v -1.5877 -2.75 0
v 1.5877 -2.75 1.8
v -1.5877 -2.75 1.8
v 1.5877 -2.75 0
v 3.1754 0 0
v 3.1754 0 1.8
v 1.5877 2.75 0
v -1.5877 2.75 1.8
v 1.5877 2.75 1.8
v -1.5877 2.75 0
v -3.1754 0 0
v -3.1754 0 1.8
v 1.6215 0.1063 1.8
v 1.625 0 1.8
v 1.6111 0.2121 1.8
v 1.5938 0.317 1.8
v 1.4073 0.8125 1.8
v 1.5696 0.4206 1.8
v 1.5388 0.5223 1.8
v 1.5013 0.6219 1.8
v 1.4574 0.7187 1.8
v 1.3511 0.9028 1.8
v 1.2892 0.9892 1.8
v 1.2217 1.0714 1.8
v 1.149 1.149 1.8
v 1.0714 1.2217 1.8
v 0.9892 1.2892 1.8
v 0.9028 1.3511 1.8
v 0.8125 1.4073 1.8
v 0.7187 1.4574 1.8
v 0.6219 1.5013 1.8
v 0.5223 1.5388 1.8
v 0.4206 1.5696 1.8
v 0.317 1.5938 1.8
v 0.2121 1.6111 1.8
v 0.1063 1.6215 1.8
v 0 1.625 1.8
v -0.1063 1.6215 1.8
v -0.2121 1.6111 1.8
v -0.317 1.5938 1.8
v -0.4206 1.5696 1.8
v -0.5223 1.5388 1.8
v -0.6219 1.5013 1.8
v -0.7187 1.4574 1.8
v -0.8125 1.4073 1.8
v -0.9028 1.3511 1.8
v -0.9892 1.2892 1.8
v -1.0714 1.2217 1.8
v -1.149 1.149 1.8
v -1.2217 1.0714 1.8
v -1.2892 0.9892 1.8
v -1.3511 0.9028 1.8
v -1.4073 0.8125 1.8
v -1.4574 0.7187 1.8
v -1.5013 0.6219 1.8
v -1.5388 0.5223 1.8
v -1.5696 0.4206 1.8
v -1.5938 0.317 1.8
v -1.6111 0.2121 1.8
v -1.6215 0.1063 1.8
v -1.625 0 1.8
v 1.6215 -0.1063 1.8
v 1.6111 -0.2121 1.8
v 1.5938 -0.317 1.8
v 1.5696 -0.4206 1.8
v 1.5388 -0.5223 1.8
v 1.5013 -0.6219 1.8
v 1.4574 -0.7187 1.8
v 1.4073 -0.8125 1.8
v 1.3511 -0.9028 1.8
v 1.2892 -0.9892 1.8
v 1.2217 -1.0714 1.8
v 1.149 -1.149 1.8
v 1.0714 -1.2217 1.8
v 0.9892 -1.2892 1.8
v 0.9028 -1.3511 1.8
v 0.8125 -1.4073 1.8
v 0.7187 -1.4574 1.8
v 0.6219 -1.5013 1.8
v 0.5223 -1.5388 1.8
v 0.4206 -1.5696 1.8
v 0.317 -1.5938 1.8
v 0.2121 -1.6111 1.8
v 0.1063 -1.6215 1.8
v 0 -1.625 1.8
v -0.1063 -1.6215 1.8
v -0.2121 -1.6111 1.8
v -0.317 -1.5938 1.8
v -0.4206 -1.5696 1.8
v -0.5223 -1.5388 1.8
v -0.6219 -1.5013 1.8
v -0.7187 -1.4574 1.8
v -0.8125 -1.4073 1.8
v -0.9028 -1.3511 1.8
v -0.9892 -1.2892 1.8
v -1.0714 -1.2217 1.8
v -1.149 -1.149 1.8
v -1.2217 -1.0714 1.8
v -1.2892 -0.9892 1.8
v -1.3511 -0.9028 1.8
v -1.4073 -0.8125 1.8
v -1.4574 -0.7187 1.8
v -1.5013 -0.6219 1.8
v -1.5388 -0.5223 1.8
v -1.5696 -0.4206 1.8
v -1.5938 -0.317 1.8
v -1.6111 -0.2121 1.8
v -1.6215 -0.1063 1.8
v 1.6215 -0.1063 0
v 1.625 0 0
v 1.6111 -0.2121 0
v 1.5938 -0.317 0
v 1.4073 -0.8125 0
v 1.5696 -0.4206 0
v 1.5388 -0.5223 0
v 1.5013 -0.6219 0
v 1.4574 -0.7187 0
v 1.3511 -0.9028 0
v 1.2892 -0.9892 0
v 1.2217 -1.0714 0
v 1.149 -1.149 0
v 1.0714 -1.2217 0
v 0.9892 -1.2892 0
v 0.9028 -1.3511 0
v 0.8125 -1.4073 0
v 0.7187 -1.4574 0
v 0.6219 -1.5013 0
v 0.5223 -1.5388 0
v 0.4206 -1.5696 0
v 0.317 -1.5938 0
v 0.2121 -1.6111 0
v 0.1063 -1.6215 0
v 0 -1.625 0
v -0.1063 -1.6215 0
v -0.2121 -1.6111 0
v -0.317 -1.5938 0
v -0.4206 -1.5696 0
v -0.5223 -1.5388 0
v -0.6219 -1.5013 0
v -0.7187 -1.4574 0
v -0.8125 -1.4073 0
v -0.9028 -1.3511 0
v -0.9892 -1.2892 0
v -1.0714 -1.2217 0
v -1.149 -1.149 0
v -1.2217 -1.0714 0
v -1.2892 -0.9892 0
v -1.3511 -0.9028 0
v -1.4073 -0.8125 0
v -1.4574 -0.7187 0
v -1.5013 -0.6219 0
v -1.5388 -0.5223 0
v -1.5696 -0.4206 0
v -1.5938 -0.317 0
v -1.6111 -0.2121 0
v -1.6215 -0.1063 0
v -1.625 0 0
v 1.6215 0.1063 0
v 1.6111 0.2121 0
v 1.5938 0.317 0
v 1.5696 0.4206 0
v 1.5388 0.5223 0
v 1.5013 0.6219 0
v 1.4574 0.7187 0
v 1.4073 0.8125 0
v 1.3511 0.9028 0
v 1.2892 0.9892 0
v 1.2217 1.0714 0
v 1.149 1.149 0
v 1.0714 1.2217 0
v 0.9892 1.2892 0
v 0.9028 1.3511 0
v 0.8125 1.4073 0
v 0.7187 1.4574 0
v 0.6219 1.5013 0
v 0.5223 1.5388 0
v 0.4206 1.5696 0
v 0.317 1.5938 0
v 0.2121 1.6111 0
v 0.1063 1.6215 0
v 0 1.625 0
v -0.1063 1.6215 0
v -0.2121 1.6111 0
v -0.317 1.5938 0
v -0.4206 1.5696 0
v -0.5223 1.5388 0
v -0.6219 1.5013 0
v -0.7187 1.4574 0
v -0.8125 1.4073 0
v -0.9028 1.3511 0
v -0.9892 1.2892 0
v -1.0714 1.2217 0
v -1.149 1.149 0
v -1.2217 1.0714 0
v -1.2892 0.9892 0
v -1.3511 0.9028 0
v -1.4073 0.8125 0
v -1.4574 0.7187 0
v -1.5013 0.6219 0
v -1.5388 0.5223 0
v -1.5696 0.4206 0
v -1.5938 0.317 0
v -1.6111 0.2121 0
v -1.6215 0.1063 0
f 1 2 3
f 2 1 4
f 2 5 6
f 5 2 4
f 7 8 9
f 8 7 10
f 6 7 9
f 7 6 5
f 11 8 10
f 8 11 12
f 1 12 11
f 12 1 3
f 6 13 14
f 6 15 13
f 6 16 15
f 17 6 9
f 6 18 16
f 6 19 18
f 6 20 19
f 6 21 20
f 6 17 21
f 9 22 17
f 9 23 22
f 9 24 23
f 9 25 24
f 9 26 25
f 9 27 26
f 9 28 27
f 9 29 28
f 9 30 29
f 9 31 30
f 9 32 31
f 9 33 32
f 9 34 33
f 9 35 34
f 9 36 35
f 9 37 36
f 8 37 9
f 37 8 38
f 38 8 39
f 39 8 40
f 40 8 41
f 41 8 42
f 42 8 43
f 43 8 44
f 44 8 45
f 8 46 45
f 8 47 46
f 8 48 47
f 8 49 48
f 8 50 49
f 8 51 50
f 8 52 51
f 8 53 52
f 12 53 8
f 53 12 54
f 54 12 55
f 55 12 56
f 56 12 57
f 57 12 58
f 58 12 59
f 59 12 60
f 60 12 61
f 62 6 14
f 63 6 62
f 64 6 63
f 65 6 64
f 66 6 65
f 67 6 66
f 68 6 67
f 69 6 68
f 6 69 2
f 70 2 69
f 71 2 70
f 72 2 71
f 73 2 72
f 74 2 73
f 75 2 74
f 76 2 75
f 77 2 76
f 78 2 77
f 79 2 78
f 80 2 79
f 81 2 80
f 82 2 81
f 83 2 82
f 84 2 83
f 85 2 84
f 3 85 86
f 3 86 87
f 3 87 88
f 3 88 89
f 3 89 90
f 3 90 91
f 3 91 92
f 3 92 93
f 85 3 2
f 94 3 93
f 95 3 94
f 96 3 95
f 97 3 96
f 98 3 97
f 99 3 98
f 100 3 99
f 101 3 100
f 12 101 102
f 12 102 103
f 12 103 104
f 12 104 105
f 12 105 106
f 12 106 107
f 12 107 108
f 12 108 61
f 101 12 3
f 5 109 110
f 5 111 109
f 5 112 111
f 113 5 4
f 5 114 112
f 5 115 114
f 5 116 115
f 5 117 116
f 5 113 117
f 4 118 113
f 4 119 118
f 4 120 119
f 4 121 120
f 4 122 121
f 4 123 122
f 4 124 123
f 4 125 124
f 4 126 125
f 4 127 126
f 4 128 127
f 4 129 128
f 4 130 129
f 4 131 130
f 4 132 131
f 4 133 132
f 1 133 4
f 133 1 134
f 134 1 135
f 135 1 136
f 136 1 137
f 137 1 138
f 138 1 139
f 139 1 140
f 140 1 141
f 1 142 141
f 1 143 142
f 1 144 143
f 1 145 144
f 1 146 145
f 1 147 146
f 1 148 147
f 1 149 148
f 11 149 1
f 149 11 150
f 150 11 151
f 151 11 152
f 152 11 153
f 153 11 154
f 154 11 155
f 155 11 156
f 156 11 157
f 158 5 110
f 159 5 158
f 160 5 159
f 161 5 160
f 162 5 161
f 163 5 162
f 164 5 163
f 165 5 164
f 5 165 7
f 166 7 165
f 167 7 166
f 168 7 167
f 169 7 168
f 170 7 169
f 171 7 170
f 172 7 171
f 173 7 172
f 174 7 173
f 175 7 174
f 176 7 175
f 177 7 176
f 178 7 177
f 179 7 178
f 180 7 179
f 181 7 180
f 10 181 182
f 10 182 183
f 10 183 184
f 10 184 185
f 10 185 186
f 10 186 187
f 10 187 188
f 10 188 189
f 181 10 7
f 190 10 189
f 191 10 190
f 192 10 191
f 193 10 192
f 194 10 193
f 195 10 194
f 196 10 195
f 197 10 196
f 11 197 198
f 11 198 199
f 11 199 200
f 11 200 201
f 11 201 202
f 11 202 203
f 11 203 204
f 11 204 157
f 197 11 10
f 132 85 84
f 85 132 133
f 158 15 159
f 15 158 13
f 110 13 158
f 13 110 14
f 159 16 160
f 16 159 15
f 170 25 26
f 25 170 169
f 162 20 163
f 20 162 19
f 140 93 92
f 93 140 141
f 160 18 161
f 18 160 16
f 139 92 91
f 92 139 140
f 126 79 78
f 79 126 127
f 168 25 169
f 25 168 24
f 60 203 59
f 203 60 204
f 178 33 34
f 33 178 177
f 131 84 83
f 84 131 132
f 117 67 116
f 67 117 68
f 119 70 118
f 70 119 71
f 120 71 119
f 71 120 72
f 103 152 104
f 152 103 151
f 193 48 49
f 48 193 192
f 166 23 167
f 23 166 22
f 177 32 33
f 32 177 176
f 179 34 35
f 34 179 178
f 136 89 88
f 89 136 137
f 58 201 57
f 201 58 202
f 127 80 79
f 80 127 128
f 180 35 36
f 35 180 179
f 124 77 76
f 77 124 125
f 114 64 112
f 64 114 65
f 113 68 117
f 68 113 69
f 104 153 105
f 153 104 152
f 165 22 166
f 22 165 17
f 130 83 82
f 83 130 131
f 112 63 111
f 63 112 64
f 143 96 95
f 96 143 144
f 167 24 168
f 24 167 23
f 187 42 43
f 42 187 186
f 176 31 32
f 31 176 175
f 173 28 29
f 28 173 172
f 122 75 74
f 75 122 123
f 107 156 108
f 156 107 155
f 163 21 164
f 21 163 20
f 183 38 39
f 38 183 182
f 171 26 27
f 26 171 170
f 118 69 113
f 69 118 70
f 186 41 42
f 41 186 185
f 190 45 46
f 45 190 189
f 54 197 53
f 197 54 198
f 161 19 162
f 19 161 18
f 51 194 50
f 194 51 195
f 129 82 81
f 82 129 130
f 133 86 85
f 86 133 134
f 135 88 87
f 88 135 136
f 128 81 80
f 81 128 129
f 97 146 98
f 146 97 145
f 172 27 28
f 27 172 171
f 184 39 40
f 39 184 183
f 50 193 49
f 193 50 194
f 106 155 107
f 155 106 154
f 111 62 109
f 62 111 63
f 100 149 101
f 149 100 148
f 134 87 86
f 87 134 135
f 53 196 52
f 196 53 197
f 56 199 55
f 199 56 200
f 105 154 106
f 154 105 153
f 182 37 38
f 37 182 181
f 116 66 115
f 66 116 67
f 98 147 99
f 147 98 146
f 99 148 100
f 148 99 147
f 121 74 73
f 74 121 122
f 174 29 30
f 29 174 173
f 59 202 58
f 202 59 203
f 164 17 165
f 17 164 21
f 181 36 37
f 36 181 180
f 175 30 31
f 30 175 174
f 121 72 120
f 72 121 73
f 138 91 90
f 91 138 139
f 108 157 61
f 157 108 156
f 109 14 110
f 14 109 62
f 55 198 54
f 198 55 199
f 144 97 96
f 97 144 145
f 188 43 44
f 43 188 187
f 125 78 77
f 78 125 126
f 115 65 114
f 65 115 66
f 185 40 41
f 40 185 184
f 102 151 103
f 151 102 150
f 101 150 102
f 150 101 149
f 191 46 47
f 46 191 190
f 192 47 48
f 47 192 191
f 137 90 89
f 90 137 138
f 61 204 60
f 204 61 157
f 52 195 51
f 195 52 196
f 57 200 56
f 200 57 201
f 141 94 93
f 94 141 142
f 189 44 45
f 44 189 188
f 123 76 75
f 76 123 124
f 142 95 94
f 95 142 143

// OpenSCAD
$fn = 96;

across_flats = 5.5;   // mm
thickness    = 1.8;   // mm
screw_d      = 3.0;   // mm (clearance hole)

clearance = 0.25;     // mm added to screw diameter for clearance
hole_d = screw_d + clearance;

module hex_prism_af(af, h) {
    // For a regular hexagon, circumradius R = af / sqrt(3)
    R = af / sqrt(3);
    cylinder(h = h, r = R, $fn = 6);
}

difference() {
    hex_prism_af(across_flats, thickness);
    translate([0,0,-0.1])
        cylinder(h = thickness + 0.2, d = hole_d, $fn = 96);
}
